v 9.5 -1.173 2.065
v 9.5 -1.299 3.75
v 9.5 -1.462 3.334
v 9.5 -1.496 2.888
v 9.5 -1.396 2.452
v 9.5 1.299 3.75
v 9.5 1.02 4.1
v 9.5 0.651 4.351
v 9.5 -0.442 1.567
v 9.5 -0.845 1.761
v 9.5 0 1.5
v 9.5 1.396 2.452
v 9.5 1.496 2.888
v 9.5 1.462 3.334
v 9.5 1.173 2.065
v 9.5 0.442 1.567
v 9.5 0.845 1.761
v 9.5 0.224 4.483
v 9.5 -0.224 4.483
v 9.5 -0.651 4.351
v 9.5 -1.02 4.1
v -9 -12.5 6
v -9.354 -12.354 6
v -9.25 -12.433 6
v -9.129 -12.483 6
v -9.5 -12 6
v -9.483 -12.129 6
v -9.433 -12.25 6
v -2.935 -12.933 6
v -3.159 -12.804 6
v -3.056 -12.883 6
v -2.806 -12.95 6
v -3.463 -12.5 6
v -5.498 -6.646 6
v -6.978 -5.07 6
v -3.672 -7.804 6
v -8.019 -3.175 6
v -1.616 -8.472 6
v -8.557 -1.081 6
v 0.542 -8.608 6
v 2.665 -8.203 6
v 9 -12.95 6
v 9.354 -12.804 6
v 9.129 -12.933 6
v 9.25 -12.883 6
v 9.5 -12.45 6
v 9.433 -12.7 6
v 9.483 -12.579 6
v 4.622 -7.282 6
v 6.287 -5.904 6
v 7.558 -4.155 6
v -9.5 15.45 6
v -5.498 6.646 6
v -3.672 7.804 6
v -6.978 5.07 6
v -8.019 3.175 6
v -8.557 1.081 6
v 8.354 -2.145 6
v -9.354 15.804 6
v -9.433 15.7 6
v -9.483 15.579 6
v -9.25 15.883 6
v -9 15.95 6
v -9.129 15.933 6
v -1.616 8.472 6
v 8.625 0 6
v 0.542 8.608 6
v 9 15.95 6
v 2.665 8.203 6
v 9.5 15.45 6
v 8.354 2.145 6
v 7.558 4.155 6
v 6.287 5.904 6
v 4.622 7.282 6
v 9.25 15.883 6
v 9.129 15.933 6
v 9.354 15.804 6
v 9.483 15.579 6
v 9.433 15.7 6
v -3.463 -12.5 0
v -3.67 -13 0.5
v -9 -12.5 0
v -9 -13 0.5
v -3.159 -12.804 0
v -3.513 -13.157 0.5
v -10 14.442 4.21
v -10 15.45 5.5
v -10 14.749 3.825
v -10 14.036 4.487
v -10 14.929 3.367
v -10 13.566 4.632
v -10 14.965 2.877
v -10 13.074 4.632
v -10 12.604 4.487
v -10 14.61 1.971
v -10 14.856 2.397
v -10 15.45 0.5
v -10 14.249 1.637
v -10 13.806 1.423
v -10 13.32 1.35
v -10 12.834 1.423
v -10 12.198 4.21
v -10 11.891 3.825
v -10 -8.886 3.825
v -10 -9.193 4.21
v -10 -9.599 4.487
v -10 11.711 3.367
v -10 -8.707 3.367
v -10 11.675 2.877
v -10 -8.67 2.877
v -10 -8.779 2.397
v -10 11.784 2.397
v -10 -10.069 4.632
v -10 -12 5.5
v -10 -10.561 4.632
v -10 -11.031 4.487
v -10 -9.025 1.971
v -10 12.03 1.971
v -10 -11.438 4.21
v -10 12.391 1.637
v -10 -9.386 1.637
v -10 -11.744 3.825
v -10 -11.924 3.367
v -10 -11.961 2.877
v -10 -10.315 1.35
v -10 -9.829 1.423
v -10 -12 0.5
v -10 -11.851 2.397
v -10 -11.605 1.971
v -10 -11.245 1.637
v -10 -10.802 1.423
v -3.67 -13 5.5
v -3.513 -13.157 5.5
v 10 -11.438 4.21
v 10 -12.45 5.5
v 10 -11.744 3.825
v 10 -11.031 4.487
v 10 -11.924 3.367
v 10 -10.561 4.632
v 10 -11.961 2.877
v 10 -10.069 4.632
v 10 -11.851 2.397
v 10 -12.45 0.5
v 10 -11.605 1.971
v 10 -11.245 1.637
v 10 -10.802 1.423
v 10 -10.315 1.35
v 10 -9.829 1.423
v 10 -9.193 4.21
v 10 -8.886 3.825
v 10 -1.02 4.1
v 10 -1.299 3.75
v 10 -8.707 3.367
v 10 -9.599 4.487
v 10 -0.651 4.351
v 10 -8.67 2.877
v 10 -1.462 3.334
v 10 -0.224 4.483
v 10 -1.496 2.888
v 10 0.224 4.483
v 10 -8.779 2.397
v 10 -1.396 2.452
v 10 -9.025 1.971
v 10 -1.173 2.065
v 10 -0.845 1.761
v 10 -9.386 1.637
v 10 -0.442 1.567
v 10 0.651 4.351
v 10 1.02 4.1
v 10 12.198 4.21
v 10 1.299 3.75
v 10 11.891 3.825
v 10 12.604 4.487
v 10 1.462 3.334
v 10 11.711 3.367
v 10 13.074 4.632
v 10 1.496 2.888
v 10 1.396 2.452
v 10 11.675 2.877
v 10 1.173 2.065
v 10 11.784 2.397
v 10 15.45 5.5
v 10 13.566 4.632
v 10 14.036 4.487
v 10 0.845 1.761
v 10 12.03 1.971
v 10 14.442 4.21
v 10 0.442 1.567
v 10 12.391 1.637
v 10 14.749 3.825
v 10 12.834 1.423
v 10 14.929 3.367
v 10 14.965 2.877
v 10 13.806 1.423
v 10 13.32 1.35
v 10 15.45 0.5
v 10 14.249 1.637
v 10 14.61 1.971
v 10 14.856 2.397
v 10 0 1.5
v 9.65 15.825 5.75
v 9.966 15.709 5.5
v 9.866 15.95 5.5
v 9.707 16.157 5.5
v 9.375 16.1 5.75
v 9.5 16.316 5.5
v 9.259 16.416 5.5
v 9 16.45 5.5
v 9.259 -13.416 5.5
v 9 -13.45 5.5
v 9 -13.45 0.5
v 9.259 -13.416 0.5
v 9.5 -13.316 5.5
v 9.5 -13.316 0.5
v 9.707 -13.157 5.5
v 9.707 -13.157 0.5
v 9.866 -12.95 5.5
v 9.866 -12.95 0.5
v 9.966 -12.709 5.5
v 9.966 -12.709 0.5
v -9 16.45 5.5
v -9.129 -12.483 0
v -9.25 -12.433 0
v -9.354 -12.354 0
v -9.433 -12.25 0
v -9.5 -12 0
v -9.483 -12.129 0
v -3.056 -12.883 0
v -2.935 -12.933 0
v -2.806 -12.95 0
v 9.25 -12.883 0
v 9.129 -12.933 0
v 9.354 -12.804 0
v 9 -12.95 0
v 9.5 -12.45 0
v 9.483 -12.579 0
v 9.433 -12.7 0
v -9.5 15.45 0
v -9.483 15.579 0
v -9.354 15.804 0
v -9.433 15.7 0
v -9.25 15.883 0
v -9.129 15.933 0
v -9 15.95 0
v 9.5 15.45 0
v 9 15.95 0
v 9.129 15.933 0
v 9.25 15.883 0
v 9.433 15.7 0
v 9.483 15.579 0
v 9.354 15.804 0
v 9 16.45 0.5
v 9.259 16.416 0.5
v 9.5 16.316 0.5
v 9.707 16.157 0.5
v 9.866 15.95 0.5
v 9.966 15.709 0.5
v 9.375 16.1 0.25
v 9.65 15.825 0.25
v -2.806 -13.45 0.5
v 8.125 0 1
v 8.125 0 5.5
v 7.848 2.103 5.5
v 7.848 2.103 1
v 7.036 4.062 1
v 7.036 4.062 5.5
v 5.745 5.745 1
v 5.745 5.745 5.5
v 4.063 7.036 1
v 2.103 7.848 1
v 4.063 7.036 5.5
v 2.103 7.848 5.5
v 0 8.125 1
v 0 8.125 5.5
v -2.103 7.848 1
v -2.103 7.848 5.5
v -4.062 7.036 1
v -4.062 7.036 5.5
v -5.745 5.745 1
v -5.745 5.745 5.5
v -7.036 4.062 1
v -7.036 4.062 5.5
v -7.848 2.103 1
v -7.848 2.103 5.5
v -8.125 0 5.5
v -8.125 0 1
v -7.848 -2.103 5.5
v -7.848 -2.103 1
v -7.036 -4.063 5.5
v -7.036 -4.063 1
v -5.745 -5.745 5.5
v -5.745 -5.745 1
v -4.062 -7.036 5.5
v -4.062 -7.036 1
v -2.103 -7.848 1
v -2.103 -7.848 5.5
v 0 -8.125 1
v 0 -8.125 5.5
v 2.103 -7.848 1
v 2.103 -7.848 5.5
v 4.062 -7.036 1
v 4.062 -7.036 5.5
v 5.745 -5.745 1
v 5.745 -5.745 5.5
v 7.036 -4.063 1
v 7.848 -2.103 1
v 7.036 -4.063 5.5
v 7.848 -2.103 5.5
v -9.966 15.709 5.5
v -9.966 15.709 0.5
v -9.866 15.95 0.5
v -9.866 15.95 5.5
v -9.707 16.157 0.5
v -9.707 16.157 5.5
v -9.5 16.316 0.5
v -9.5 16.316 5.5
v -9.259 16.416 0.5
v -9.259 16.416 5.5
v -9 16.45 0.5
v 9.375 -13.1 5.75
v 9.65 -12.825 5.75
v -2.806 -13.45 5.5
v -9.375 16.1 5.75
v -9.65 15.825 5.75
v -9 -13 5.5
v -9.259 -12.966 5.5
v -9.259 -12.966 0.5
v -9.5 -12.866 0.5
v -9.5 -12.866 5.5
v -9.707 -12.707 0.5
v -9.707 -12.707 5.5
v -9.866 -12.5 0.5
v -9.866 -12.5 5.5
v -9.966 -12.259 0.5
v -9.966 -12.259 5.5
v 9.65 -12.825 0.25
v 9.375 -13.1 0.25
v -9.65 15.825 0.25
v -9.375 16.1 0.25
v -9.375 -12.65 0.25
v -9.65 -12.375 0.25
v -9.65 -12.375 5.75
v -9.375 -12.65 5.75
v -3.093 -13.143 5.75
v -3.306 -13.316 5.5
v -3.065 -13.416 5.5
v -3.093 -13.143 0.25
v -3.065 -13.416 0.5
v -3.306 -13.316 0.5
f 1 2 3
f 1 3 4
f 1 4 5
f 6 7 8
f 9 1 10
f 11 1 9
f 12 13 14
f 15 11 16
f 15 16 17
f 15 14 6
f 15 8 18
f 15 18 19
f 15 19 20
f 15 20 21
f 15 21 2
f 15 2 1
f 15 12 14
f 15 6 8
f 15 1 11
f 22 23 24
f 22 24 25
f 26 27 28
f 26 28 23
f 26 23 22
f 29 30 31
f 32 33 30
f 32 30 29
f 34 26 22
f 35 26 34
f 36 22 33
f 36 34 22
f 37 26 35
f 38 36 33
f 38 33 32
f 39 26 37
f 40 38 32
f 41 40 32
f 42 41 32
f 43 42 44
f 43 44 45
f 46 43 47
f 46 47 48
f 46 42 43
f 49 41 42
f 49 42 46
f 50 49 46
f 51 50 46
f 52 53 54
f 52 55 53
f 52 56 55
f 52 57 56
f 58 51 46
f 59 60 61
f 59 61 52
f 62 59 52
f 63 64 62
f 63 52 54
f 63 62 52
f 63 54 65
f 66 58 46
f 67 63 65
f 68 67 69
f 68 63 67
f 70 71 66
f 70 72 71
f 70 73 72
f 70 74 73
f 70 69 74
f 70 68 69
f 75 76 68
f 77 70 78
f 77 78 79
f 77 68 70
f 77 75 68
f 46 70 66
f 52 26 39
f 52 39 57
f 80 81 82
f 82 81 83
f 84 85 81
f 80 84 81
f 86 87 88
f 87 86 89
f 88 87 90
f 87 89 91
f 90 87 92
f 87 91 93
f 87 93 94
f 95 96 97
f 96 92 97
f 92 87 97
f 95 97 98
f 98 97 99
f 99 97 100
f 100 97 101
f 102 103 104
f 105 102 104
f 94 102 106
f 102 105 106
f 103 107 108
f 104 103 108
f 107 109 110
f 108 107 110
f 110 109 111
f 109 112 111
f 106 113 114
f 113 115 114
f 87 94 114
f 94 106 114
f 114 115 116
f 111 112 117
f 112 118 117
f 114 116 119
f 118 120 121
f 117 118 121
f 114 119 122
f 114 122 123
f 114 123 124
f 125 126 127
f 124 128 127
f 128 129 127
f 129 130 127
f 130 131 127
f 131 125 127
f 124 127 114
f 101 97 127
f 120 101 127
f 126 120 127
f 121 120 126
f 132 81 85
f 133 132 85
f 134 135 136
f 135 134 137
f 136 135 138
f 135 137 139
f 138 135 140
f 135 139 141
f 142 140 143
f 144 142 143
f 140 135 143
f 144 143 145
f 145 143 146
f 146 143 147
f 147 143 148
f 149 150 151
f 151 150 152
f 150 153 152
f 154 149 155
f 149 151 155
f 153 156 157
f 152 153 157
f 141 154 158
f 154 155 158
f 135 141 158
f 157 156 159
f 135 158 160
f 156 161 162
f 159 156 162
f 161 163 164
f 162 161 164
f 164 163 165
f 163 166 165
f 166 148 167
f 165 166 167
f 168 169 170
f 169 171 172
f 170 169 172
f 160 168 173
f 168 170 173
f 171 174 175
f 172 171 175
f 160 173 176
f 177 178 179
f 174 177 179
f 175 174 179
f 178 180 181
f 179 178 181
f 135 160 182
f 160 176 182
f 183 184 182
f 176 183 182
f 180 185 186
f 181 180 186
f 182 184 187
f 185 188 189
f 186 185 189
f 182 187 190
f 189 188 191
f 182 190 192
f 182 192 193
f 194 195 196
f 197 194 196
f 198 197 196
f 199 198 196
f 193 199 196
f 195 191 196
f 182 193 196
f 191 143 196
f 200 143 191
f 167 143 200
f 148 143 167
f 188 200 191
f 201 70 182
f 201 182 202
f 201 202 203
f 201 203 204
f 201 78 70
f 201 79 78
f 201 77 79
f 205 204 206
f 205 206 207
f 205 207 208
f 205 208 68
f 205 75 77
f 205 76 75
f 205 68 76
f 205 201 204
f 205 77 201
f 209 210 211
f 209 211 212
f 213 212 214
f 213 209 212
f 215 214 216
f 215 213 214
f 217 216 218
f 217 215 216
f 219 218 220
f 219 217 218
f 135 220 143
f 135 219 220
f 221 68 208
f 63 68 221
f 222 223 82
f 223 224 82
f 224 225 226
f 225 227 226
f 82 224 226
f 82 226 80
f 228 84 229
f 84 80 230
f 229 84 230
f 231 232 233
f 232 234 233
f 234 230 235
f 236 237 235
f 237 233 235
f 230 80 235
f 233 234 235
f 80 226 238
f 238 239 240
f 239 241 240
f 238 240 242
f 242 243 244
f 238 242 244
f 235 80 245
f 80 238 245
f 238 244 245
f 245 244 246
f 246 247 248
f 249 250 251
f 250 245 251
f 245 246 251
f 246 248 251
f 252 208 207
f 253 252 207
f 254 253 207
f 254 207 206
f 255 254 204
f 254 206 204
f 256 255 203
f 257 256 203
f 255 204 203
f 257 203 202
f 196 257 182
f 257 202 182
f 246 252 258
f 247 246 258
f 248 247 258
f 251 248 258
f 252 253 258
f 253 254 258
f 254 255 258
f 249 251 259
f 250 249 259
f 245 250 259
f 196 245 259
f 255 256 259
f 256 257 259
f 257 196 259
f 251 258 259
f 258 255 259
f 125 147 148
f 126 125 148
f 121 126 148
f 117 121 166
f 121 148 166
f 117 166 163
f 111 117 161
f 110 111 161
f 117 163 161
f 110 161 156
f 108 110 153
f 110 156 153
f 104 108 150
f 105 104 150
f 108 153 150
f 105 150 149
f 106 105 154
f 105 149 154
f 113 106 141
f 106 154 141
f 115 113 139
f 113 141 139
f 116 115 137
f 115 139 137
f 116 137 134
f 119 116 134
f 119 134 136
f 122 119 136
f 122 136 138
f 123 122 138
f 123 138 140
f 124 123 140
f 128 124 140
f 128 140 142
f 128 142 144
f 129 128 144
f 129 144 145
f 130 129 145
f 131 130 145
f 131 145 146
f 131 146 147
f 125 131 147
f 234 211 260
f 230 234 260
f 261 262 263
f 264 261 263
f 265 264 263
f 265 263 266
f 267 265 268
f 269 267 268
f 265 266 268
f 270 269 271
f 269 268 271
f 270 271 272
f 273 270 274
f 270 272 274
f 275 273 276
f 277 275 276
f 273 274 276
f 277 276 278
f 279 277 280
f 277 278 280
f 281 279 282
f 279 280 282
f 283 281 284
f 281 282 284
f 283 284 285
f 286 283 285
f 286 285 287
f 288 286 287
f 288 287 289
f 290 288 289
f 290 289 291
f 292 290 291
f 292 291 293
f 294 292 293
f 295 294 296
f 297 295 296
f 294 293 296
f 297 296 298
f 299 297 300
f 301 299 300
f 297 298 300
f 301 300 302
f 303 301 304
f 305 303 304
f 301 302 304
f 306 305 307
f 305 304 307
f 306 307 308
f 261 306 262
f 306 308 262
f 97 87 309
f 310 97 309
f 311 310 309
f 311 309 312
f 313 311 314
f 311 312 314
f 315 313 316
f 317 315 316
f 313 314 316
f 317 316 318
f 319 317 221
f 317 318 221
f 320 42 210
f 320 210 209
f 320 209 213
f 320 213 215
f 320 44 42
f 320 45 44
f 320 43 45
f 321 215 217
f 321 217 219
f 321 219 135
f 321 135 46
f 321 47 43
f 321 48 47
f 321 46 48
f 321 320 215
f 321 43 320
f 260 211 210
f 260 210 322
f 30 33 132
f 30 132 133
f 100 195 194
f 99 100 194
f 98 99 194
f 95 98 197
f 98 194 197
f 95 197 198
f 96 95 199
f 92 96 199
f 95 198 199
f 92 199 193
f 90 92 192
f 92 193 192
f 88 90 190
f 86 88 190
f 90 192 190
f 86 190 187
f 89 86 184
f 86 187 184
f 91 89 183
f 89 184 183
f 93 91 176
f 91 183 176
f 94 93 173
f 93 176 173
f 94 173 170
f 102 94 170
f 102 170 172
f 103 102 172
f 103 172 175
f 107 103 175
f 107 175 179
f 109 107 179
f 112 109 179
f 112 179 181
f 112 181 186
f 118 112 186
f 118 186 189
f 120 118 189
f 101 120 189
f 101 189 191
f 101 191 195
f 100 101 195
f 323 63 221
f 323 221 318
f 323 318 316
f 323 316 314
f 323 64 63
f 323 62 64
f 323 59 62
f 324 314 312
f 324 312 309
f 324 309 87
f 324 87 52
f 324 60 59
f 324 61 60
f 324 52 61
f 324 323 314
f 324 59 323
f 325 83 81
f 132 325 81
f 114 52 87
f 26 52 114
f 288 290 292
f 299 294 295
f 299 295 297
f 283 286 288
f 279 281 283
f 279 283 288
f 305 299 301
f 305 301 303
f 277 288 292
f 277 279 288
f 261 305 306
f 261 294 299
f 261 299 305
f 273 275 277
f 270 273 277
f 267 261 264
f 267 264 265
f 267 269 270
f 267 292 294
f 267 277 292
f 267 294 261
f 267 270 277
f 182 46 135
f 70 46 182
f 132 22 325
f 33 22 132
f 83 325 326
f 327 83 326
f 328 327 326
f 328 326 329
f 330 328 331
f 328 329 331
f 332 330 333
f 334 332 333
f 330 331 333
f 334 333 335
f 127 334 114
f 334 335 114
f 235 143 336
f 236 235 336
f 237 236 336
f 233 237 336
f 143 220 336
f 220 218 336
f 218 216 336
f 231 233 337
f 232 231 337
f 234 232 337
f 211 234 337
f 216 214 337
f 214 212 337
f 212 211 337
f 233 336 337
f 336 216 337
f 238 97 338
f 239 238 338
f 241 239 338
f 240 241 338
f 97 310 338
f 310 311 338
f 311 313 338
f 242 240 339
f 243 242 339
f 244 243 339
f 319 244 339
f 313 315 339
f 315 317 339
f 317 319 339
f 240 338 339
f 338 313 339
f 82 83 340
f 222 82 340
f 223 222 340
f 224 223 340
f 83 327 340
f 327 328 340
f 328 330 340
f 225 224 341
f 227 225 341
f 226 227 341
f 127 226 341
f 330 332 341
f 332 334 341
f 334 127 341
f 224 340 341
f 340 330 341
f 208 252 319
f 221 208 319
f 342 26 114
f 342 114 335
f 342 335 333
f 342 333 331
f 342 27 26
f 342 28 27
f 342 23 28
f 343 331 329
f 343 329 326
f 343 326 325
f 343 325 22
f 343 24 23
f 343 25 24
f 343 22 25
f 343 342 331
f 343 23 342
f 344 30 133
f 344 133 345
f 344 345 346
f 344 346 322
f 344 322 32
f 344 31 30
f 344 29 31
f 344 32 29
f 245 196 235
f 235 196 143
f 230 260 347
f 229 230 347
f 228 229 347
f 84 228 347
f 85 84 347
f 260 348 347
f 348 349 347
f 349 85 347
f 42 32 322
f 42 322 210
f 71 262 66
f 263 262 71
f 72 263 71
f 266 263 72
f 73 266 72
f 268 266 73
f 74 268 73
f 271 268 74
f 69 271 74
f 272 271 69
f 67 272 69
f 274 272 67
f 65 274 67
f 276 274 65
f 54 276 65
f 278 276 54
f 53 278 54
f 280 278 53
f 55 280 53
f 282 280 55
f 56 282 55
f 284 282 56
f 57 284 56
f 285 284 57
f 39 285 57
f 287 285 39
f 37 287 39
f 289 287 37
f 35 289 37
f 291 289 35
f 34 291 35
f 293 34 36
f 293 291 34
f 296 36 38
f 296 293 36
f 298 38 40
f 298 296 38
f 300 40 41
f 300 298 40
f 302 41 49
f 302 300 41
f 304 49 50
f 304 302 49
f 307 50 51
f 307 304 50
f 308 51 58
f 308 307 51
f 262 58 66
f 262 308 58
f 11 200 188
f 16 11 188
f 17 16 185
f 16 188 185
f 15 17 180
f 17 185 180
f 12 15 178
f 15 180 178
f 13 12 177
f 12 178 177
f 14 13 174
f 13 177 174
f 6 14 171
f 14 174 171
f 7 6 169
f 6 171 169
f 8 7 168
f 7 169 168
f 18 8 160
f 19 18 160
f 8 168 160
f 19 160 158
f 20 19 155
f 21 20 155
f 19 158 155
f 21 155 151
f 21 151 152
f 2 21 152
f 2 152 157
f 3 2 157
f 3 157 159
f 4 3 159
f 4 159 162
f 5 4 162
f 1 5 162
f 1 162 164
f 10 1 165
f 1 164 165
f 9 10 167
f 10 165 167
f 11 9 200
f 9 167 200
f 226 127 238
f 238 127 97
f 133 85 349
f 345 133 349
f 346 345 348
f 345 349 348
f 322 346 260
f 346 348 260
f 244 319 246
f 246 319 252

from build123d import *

# Parameters (mm, degrees)
BOSS_EXTRUDE1_DEPTH = 6
SKETCH2_R           = 8.125
CUT_EXTRUDE1_DEPTH  = 5
SKETCH3_R           = 1.5
CUT_EXTRUDE2_DEPTH  = 0.5
SKETCH4_R           = 1.65
CUT_EXTRUDE3_DEPTH  = 21
SKETCH5_W           = 20
SKETCH5_H           = 0.05
CUT_EXTRUDE4_DEPTH  = 7
FILLET1_R           = 1
CHAMFER1_SIZE       = 0.5


with BuildPart() as part:
    # Sketch1 → Boss-Extrude1 (new body)
    with BuildSketch(Plane.XY):
        Polygon((-3.170042294, -13.5), (10, -13.5), (10, 13.5), (10, 16.5), (-10, 16.5), (-10, 13.5), (-10, -13), (-3.670042294, -13), align=None)
    extrude(amount=BOSS_EXTRUDE1_DEPTH)

    # Sketch2 → Cut-Extrude1 (cut)
    with BuildSketch(Plane.XY.offset(6)):
        Circle(SKETCH2_R)
    extrude(amount=-CUT_EXTRUDE1_DEPTH, mode=Mode.SUBTRACT)

    # Sketch3 → Cut-Extrude2 (cut)
    with BuildSketch(Plane(origin=(10, 0, 0), x_dir=(0, 0, -1), z_dir=(1, 0, 0))):
        with Locations((-3, 0)):
            Circle(SKETCH3_R)
    extrude(amount=-CUT_EXTRUDE2_DEPTH, mode=Mode.SUBTRACT)

    # Sketch4 → Cut-Extrude3 (cut, through all)
    with BuildSketch(Plane(origin=(10, 0, 0), x_dir=(0, 0, -1), z_dir=(1, 0, 0))):
        with Locations((-3, 13.32)):
            Circle(SKETCH4_R)
        with Locations((-3, -10.31539104)):
            Circle(SKETCH4_R)
    extrude(amount=-CUT_EXTRUDE3_DEPTH, mode=Mode.SUBTRACT)

    # Sketch5 → Cut-Extrude4 (cut, through all)
    with BuildSketch(Plane(origin=(0, 0, 0), x_dir=(-1, 0, 0), z_dir=(0, 0, -1))):
        with Locations((0, 16.475)):
            Rectangle(SKETCH5_W, SKETCH5_H)
        with Locations((0, -13.475)):
            Rectangle(SKETCH5_W, SKETCH5_H)
    extrude(amount=-CUT_EXTRUDE4_DEPTH, mode=Mode.SUBTRACT)

    # Fillet1
    fillet1_edges = [part.edges().sort_by_distance(p)[0] for p in [
        (-10, -13, 3),
        (-10, 16.45, 3),
        (10, 16.45, 3),
        (-3.220042294, -13.45, 3),
        (10, -13.45, 3),
    ]]
    fillet(fillet1_edges, radius=FILLET1_R)

    # Chamfer1
    chamfer1_edges = [part.edges().sort_by_distance(p)[0] for p in [
        (-9.707106781, 16.157106781, 0),
        (9.707106781, -13.157106781, 0),
        (-3.188512164, -13.373879533, 0),
        (-3.591488904, -13.078553391, 6),
        (-8.125, 0, 6),
        (0, 16.45, 6),
        (-10, 1.725, 6),
        (-6.335021147, -13, 6),
        (3.097085634, -13.45, 6),
        (10, 1.5, 6),
        (-9.707106781, -12.707106781, 6),
        (9.707106781, 16.157106781, 6),
        (-9.707106781, 16.157106781, 6),
        (9.707106781, -13.157106781, 6),
        (-3.591488904, -13.078553391, 0),
        (-3.188512164, -13.373879533, 6),
        (3.097085634, -13.45, 0),
        (-10, 1.725, 0),
        (0, 16.45, 0),
        (10, 1.5, 0),
        (-6.335021147, -13, 0),
        (-9.707106781, -12.707106781, 0),
        (9.707106781, 16.157106781, 0),
    ]]
    chamfer(chamfer1_edges, length=CHAMFER1_SIZE)


solid = part.part
